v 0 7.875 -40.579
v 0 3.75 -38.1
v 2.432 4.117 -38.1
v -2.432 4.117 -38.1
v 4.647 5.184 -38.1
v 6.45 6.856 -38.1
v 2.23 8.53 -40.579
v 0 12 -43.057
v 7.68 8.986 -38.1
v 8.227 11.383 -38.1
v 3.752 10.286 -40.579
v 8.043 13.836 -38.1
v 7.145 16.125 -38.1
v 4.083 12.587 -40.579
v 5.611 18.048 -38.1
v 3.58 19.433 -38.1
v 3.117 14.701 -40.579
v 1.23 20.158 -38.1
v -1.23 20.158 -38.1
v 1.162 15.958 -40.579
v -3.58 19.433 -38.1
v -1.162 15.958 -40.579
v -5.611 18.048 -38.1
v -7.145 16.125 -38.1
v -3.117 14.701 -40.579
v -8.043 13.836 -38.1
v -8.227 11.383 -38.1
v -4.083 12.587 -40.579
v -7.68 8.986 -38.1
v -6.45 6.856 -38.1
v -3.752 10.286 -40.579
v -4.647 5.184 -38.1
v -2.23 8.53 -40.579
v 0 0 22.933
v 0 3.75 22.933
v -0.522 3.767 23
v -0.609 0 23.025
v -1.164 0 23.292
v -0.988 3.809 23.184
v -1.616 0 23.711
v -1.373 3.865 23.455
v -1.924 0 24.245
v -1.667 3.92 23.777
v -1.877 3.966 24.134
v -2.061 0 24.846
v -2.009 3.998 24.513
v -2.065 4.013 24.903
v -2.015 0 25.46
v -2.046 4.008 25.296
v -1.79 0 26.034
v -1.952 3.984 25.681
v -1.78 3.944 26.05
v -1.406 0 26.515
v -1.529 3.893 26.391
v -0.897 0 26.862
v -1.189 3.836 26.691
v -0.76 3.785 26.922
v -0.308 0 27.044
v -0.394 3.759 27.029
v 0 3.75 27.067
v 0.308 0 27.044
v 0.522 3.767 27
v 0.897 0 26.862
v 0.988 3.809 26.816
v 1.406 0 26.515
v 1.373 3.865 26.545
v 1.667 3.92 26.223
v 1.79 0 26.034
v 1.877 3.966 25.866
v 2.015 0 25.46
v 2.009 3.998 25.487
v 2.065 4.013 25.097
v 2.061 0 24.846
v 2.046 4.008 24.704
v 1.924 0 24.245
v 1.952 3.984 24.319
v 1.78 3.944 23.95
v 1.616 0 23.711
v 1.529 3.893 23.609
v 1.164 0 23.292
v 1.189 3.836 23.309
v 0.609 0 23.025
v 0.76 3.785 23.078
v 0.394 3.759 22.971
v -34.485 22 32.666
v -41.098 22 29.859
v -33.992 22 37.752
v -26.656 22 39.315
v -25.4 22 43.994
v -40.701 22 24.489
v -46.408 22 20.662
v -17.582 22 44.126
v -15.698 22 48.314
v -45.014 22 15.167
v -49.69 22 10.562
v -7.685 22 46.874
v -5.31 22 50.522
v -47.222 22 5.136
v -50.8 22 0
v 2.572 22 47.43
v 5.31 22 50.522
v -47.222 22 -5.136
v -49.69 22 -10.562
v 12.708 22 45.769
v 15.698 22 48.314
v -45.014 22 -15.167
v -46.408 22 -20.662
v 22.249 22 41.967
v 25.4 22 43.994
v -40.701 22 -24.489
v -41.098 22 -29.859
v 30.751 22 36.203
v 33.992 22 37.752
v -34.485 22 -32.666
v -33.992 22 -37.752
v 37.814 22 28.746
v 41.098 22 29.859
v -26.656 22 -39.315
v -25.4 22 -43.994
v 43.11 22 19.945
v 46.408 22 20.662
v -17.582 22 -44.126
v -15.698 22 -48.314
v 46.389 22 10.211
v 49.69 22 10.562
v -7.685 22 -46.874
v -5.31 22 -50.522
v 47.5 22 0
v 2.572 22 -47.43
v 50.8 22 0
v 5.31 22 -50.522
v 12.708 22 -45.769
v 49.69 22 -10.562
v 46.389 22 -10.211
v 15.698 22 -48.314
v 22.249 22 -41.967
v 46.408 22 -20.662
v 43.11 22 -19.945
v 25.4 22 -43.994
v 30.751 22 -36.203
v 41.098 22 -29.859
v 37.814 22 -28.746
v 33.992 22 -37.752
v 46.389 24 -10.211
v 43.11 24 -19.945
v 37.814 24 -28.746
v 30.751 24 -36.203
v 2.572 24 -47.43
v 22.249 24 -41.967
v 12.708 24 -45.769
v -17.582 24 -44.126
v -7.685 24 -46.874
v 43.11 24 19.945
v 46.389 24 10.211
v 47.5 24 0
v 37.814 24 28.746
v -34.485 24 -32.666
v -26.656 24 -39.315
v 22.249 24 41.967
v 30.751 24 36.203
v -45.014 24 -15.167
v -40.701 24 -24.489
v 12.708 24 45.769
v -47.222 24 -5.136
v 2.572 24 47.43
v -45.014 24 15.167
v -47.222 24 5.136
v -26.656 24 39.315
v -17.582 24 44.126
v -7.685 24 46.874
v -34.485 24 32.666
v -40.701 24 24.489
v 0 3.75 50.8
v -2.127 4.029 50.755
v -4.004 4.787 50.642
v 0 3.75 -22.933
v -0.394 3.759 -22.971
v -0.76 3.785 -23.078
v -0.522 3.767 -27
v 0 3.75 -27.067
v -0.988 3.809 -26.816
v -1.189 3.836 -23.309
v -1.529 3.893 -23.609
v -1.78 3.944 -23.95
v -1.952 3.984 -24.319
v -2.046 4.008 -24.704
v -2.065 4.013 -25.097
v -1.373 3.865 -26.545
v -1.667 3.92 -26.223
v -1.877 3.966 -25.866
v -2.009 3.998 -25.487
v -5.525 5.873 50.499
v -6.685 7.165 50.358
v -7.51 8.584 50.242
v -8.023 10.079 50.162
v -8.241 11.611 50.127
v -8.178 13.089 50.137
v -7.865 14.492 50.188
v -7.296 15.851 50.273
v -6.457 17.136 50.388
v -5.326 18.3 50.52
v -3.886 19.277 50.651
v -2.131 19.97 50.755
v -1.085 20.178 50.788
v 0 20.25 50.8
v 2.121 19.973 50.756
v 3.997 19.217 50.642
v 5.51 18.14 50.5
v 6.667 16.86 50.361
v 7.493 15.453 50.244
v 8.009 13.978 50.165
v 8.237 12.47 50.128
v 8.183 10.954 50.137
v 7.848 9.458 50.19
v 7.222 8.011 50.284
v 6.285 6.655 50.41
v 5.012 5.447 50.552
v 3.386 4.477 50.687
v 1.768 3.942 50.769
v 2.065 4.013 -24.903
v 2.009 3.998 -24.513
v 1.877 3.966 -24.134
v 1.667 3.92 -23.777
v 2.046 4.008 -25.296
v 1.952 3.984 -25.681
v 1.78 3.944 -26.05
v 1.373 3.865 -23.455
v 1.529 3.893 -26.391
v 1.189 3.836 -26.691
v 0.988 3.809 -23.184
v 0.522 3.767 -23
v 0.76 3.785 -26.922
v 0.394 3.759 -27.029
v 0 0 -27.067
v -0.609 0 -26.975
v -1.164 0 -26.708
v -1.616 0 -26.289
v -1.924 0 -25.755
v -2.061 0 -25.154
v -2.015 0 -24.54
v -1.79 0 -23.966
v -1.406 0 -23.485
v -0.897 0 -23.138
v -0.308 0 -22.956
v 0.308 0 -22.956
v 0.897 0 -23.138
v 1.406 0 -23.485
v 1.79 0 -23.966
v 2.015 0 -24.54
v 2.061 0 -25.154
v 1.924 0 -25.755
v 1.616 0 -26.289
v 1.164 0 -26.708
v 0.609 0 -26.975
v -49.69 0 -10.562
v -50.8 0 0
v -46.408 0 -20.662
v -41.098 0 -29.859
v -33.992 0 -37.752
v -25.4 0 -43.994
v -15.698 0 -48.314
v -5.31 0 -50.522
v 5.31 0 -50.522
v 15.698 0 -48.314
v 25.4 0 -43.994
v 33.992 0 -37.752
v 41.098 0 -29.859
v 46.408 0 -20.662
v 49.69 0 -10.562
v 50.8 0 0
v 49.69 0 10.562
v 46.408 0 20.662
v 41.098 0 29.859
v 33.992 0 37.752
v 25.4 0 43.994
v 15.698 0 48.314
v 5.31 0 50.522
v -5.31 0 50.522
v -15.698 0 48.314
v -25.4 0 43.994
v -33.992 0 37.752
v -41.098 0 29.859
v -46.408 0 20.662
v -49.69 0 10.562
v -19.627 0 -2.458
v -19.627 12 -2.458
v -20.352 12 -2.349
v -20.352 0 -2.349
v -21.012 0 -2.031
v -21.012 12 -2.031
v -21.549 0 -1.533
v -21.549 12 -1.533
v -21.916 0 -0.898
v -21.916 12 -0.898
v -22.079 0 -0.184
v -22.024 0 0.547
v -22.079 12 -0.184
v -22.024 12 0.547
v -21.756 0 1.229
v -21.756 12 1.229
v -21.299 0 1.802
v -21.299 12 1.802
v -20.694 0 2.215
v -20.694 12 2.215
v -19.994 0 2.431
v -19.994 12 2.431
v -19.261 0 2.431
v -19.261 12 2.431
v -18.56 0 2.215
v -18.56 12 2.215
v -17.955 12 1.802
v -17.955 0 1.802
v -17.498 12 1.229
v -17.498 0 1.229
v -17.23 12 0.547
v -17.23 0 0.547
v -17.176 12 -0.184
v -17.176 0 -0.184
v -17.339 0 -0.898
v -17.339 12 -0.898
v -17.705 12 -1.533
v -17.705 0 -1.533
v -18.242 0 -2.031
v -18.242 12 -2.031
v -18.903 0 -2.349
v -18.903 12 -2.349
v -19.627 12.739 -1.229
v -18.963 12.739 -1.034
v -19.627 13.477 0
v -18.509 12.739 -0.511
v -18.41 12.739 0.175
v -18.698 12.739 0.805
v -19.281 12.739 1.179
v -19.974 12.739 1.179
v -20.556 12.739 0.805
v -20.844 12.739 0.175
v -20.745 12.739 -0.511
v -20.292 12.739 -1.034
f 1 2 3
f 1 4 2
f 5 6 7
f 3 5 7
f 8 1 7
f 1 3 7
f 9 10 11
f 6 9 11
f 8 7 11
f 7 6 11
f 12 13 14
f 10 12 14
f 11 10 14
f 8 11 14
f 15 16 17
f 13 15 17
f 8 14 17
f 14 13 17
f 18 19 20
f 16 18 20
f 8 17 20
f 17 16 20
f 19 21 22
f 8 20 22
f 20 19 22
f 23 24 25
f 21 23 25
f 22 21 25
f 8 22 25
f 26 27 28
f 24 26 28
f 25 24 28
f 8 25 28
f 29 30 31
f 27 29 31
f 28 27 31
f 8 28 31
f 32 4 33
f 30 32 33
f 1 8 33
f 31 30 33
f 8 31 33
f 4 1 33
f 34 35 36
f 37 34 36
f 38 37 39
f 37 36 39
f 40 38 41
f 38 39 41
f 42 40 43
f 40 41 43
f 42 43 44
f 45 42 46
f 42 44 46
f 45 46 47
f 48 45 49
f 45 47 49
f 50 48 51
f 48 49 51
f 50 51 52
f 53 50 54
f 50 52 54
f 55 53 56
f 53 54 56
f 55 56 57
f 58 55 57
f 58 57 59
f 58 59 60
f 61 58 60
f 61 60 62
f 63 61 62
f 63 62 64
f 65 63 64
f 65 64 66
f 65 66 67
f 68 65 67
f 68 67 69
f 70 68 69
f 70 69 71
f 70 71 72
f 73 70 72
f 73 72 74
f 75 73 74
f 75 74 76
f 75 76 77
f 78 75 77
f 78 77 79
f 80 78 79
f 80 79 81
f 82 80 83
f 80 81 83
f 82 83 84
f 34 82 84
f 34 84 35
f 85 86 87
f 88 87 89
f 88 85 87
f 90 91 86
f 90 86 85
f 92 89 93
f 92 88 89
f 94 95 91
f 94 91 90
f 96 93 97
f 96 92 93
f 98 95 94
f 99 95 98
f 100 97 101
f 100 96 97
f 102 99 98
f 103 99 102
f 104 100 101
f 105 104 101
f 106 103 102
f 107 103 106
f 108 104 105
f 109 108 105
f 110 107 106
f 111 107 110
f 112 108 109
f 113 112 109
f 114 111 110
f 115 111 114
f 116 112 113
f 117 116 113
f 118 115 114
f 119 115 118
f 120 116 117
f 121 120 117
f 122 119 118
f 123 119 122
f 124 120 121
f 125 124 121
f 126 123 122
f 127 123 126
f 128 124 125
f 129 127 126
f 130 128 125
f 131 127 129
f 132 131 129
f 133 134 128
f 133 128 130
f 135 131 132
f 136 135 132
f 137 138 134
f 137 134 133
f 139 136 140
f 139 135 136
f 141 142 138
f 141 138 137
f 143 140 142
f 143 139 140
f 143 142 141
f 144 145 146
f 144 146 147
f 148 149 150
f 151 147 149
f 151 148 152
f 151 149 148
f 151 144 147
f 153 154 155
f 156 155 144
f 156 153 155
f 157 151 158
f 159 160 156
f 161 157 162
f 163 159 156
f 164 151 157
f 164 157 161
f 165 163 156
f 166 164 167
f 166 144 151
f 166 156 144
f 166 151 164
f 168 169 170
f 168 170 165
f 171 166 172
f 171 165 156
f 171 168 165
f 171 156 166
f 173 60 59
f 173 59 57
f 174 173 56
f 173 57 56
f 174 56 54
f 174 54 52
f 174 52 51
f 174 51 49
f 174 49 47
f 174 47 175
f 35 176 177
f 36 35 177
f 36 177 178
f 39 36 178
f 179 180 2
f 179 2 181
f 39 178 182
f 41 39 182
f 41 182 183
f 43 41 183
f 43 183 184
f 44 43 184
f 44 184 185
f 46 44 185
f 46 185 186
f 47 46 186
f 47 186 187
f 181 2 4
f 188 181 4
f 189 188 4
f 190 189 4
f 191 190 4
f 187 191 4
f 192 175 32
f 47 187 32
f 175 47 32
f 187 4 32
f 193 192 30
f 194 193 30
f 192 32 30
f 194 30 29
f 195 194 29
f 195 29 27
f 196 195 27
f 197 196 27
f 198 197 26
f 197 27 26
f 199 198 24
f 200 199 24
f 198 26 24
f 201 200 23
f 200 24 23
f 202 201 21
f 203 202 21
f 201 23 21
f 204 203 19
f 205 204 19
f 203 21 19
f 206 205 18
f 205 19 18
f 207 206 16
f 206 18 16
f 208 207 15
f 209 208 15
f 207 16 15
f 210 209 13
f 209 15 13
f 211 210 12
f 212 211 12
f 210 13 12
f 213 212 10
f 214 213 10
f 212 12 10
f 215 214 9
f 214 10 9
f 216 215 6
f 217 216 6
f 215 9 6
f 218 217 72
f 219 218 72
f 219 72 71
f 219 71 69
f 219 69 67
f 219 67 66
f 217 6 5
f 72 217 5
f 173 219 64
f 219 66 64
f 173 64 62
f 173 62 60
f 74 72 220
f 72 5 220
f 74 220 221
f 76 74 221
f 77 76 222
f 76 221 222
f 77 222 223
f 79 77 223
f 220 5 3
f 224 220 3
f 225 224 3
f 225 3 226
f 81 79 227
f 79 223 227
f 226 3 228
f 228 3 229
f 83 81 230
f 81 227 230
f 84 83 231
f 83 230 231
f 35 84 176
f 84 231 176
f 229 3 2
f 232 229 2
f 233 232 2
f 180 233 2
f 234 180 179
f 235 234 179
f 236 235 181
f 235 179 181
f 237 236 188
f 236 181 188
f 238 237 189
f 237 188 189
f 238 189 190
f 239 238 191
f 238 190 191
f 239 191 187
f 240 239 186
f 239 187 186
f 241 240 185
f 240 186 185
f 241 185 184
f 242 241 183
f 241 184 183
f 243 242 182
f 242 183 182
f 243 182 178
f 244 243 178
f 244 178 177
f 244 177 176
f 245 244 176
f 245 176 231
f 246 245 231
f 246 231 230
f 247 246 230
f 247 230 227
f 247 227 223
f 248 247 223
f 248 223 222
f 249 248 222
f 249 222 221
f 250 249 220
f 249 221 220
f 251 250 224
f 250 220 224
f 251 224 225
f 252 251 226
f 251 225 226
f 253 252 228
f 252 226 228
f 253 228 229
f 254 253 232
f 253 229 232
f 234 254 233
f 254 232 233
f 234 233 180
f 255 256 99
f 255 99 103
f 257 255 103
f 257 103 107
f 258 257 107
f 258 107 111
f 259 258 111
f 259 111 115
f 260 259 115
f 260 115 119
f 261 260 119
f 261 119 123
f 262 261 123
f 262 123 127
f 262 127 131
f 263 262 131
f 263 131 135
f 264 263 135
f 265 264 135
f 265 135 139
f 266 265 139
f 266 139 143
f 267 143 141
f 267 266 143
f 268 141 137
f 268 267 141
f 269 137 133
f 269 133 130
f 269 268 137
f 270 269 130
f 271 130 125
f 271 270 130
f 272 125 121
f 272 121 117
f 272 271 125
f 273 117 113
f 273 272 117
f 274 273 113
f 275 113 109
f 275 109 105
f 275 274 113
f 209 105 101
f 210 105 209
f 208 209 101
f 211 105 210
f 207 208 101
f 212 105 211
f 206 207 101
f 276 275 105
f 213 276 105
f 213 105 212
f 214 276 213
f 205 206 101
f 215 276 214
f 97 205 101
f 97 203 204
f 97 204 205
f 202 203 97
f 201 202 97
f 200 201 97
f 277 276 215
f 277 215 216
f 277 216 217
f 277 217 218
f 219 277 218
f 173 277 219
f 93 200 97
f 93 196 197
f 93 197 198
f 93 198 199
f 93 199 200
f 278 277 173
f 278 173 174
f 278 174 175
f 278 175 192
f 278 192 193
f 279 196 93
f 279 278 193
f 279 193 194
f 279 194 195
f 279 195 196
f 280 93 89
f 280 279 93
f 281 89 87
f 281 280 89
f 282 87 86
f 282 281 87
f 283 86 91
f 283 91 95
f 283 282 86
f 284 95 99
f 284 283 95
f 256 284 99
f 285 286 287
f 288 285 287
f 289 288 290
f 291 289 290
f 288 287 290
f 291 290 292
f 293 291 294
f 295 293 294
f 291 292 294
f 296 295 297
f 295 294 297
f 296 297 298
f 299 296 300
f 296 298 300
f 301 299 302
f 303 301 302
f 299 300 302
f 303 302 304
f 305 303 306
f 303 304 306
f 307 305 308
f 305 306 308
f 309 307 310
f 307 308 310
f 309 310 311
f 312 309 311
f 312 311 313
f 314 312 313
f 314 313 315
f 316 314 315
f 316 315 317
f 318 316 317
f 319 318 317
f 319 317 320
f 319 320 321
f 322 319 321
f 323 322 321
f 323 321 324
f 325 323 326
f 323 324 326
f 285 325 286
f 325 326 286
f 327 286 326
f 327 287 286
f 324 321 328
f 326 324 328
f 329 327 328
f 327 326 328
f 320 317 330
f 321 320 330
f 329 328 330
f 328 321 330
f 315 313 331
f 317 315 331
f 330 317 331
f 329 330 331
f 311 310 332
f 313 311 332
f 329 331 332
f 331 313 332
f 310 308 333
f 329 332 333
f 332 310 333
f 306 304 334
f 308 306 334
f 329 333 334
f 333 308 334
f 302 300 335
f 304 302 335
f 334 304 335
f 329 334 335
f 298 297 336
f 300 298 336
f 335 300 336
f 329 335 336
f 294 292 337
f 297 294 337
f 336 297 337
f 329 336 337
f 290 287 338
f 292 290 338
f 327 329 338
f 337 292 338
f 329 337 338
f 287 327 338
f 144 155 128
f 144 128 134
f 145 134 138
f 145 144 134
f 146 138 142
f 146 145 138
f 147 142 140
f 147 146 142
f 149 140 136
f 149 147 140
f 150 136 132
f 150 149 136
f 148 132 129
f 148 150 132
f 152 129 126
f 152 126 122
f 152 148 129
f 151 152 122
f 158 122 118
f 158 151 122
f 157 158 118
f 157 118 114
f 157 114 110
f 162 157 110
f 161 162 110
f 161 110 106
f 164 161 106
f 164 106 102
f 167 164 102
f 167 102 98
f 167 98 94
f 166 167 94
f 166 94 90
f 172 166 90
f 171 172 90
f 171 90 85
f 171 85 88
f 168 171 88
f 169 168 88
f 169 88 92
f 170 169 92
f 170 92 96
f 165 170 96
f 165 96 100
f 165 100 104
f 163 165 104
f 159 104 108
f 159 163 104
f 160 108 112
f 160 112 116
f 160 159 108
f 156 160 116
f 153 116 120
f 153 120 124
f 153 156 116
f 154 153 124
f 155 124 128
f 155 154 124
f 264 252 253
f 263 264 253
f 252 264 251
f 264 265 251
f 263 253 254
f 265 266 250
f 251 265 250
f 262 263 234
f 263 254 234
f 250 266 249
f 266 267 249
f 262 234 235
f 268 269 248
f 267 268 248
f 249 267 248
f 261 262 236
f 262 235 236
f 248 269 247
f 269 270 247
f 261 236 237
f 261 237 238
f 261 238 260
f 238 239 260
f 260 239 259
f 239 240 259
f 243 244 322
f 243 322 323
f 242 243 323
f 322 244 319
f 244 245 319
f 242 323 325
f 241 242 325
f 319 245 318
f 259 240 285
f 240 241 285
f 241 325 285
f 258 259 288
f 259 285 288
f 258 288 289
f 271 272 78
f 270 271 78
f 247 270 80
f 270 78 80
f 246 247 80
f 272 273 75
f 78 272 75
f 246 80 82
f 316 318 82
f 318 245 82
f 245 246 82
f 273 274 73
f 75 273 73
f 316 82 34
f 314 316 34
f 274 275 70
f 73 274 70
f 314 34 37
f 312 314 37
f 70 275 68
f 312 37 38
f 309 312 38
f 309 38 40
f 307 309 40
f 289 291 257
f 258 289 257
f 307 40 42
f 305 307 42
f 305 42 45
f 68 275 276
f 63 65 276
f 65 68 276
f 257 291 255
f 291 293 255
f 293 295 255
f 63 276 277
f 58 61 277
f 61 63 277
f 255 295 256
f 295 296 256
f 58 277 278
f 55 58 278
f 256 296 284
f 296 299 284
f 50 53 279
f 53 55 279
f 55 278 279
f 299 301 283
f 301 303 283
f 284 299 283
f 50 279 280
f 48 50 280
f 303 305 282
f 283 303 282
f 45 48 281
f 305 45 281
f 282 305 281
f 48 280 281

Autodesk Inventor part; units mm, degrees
ref_plane "YZ Plane" through (0, 0, 0) normal (1, 0, 0) x (0, 1, 0)
ref_plane "XZ Plane" through (0, 0, 0) normal (0, 1, 0) x (-1, 0, 0)
sketch "Sketch1" plane through (0, 0, 0) normal (0, 1, 0) x (-1, 0, 0)
  circle A0 centre (0, 0) radius 50.8
  dimension "d0" = 101.6
extrude "Extrusion1" add sketch "Sketch1" along normal blind 24
ref_plane "Work Plane1" through (0, 0, 50.8) normal (0, 0, 1) x (1, 0, 0)
sketch "Sketch3" plane through (0, 0, 50.8) normal (0, 0, 1) x (1, 0, 0)
  line L0 (50.8, 24) -> (-50.8, 24) projected
  line L1 (0, 24) -> (0, 12) construction
  point P0 (0, 0)
  dimension "d7" = 12
hole "Hole1" at (0, 12, 50.8) direction (0, 0, -1) diameter 16.5 depth 88.9 tip angle 118
sketch "Sketch4" plane through (0, 0, 0) normal (0, -1, 0) x (1, 0, 0)
  line L0 (0, 0) -> (0, -25) construction
  line L1 (0, 0) -> (0, 25) construction
  dimension "d15" = 25
  dimension "d16" = 25
hole "Hole2" at (0, 0, 25) at (0, 0, -25) direction (0, 1, 0) diameter 4.134 end up to surface thread size "M5x0.8" class "6H" standard "ANSI Metric M Profile"
sketch "Sketch5" plane through (0, 0, 0) normal (0, -1, 0) x (1, 0, 0)
  point P0 (0, 0)
  point P1 (-19.6272, 0)
hole "Hole3" at (-19.6272, 0, 0) direction (0, 1, 0) diameter 4.917 depth 12 tip angle 118 thread size "M6x1" class "6H" standard "ANSI Metric M Profile"
ref_plane "Work Plane2" through (0, 0, -38.1) normal (0, 0, 1) x (1, 0, 0)
sketch "Sketch7" plane through (0, 24, 0) normal (0, 1, 0) x (1, 0, 0)
  circle A0 centre (0, 0) radius 50.8
  circle A1 centre (0, 0) radius 47.5
  dimension "d35" = 101.6
  dimension "d36" = 95
extrude "Extrusion4" cut sketch "Sketch7" against normal blind 2
properties part number "Heater disk" material "Aluminum 6061"
